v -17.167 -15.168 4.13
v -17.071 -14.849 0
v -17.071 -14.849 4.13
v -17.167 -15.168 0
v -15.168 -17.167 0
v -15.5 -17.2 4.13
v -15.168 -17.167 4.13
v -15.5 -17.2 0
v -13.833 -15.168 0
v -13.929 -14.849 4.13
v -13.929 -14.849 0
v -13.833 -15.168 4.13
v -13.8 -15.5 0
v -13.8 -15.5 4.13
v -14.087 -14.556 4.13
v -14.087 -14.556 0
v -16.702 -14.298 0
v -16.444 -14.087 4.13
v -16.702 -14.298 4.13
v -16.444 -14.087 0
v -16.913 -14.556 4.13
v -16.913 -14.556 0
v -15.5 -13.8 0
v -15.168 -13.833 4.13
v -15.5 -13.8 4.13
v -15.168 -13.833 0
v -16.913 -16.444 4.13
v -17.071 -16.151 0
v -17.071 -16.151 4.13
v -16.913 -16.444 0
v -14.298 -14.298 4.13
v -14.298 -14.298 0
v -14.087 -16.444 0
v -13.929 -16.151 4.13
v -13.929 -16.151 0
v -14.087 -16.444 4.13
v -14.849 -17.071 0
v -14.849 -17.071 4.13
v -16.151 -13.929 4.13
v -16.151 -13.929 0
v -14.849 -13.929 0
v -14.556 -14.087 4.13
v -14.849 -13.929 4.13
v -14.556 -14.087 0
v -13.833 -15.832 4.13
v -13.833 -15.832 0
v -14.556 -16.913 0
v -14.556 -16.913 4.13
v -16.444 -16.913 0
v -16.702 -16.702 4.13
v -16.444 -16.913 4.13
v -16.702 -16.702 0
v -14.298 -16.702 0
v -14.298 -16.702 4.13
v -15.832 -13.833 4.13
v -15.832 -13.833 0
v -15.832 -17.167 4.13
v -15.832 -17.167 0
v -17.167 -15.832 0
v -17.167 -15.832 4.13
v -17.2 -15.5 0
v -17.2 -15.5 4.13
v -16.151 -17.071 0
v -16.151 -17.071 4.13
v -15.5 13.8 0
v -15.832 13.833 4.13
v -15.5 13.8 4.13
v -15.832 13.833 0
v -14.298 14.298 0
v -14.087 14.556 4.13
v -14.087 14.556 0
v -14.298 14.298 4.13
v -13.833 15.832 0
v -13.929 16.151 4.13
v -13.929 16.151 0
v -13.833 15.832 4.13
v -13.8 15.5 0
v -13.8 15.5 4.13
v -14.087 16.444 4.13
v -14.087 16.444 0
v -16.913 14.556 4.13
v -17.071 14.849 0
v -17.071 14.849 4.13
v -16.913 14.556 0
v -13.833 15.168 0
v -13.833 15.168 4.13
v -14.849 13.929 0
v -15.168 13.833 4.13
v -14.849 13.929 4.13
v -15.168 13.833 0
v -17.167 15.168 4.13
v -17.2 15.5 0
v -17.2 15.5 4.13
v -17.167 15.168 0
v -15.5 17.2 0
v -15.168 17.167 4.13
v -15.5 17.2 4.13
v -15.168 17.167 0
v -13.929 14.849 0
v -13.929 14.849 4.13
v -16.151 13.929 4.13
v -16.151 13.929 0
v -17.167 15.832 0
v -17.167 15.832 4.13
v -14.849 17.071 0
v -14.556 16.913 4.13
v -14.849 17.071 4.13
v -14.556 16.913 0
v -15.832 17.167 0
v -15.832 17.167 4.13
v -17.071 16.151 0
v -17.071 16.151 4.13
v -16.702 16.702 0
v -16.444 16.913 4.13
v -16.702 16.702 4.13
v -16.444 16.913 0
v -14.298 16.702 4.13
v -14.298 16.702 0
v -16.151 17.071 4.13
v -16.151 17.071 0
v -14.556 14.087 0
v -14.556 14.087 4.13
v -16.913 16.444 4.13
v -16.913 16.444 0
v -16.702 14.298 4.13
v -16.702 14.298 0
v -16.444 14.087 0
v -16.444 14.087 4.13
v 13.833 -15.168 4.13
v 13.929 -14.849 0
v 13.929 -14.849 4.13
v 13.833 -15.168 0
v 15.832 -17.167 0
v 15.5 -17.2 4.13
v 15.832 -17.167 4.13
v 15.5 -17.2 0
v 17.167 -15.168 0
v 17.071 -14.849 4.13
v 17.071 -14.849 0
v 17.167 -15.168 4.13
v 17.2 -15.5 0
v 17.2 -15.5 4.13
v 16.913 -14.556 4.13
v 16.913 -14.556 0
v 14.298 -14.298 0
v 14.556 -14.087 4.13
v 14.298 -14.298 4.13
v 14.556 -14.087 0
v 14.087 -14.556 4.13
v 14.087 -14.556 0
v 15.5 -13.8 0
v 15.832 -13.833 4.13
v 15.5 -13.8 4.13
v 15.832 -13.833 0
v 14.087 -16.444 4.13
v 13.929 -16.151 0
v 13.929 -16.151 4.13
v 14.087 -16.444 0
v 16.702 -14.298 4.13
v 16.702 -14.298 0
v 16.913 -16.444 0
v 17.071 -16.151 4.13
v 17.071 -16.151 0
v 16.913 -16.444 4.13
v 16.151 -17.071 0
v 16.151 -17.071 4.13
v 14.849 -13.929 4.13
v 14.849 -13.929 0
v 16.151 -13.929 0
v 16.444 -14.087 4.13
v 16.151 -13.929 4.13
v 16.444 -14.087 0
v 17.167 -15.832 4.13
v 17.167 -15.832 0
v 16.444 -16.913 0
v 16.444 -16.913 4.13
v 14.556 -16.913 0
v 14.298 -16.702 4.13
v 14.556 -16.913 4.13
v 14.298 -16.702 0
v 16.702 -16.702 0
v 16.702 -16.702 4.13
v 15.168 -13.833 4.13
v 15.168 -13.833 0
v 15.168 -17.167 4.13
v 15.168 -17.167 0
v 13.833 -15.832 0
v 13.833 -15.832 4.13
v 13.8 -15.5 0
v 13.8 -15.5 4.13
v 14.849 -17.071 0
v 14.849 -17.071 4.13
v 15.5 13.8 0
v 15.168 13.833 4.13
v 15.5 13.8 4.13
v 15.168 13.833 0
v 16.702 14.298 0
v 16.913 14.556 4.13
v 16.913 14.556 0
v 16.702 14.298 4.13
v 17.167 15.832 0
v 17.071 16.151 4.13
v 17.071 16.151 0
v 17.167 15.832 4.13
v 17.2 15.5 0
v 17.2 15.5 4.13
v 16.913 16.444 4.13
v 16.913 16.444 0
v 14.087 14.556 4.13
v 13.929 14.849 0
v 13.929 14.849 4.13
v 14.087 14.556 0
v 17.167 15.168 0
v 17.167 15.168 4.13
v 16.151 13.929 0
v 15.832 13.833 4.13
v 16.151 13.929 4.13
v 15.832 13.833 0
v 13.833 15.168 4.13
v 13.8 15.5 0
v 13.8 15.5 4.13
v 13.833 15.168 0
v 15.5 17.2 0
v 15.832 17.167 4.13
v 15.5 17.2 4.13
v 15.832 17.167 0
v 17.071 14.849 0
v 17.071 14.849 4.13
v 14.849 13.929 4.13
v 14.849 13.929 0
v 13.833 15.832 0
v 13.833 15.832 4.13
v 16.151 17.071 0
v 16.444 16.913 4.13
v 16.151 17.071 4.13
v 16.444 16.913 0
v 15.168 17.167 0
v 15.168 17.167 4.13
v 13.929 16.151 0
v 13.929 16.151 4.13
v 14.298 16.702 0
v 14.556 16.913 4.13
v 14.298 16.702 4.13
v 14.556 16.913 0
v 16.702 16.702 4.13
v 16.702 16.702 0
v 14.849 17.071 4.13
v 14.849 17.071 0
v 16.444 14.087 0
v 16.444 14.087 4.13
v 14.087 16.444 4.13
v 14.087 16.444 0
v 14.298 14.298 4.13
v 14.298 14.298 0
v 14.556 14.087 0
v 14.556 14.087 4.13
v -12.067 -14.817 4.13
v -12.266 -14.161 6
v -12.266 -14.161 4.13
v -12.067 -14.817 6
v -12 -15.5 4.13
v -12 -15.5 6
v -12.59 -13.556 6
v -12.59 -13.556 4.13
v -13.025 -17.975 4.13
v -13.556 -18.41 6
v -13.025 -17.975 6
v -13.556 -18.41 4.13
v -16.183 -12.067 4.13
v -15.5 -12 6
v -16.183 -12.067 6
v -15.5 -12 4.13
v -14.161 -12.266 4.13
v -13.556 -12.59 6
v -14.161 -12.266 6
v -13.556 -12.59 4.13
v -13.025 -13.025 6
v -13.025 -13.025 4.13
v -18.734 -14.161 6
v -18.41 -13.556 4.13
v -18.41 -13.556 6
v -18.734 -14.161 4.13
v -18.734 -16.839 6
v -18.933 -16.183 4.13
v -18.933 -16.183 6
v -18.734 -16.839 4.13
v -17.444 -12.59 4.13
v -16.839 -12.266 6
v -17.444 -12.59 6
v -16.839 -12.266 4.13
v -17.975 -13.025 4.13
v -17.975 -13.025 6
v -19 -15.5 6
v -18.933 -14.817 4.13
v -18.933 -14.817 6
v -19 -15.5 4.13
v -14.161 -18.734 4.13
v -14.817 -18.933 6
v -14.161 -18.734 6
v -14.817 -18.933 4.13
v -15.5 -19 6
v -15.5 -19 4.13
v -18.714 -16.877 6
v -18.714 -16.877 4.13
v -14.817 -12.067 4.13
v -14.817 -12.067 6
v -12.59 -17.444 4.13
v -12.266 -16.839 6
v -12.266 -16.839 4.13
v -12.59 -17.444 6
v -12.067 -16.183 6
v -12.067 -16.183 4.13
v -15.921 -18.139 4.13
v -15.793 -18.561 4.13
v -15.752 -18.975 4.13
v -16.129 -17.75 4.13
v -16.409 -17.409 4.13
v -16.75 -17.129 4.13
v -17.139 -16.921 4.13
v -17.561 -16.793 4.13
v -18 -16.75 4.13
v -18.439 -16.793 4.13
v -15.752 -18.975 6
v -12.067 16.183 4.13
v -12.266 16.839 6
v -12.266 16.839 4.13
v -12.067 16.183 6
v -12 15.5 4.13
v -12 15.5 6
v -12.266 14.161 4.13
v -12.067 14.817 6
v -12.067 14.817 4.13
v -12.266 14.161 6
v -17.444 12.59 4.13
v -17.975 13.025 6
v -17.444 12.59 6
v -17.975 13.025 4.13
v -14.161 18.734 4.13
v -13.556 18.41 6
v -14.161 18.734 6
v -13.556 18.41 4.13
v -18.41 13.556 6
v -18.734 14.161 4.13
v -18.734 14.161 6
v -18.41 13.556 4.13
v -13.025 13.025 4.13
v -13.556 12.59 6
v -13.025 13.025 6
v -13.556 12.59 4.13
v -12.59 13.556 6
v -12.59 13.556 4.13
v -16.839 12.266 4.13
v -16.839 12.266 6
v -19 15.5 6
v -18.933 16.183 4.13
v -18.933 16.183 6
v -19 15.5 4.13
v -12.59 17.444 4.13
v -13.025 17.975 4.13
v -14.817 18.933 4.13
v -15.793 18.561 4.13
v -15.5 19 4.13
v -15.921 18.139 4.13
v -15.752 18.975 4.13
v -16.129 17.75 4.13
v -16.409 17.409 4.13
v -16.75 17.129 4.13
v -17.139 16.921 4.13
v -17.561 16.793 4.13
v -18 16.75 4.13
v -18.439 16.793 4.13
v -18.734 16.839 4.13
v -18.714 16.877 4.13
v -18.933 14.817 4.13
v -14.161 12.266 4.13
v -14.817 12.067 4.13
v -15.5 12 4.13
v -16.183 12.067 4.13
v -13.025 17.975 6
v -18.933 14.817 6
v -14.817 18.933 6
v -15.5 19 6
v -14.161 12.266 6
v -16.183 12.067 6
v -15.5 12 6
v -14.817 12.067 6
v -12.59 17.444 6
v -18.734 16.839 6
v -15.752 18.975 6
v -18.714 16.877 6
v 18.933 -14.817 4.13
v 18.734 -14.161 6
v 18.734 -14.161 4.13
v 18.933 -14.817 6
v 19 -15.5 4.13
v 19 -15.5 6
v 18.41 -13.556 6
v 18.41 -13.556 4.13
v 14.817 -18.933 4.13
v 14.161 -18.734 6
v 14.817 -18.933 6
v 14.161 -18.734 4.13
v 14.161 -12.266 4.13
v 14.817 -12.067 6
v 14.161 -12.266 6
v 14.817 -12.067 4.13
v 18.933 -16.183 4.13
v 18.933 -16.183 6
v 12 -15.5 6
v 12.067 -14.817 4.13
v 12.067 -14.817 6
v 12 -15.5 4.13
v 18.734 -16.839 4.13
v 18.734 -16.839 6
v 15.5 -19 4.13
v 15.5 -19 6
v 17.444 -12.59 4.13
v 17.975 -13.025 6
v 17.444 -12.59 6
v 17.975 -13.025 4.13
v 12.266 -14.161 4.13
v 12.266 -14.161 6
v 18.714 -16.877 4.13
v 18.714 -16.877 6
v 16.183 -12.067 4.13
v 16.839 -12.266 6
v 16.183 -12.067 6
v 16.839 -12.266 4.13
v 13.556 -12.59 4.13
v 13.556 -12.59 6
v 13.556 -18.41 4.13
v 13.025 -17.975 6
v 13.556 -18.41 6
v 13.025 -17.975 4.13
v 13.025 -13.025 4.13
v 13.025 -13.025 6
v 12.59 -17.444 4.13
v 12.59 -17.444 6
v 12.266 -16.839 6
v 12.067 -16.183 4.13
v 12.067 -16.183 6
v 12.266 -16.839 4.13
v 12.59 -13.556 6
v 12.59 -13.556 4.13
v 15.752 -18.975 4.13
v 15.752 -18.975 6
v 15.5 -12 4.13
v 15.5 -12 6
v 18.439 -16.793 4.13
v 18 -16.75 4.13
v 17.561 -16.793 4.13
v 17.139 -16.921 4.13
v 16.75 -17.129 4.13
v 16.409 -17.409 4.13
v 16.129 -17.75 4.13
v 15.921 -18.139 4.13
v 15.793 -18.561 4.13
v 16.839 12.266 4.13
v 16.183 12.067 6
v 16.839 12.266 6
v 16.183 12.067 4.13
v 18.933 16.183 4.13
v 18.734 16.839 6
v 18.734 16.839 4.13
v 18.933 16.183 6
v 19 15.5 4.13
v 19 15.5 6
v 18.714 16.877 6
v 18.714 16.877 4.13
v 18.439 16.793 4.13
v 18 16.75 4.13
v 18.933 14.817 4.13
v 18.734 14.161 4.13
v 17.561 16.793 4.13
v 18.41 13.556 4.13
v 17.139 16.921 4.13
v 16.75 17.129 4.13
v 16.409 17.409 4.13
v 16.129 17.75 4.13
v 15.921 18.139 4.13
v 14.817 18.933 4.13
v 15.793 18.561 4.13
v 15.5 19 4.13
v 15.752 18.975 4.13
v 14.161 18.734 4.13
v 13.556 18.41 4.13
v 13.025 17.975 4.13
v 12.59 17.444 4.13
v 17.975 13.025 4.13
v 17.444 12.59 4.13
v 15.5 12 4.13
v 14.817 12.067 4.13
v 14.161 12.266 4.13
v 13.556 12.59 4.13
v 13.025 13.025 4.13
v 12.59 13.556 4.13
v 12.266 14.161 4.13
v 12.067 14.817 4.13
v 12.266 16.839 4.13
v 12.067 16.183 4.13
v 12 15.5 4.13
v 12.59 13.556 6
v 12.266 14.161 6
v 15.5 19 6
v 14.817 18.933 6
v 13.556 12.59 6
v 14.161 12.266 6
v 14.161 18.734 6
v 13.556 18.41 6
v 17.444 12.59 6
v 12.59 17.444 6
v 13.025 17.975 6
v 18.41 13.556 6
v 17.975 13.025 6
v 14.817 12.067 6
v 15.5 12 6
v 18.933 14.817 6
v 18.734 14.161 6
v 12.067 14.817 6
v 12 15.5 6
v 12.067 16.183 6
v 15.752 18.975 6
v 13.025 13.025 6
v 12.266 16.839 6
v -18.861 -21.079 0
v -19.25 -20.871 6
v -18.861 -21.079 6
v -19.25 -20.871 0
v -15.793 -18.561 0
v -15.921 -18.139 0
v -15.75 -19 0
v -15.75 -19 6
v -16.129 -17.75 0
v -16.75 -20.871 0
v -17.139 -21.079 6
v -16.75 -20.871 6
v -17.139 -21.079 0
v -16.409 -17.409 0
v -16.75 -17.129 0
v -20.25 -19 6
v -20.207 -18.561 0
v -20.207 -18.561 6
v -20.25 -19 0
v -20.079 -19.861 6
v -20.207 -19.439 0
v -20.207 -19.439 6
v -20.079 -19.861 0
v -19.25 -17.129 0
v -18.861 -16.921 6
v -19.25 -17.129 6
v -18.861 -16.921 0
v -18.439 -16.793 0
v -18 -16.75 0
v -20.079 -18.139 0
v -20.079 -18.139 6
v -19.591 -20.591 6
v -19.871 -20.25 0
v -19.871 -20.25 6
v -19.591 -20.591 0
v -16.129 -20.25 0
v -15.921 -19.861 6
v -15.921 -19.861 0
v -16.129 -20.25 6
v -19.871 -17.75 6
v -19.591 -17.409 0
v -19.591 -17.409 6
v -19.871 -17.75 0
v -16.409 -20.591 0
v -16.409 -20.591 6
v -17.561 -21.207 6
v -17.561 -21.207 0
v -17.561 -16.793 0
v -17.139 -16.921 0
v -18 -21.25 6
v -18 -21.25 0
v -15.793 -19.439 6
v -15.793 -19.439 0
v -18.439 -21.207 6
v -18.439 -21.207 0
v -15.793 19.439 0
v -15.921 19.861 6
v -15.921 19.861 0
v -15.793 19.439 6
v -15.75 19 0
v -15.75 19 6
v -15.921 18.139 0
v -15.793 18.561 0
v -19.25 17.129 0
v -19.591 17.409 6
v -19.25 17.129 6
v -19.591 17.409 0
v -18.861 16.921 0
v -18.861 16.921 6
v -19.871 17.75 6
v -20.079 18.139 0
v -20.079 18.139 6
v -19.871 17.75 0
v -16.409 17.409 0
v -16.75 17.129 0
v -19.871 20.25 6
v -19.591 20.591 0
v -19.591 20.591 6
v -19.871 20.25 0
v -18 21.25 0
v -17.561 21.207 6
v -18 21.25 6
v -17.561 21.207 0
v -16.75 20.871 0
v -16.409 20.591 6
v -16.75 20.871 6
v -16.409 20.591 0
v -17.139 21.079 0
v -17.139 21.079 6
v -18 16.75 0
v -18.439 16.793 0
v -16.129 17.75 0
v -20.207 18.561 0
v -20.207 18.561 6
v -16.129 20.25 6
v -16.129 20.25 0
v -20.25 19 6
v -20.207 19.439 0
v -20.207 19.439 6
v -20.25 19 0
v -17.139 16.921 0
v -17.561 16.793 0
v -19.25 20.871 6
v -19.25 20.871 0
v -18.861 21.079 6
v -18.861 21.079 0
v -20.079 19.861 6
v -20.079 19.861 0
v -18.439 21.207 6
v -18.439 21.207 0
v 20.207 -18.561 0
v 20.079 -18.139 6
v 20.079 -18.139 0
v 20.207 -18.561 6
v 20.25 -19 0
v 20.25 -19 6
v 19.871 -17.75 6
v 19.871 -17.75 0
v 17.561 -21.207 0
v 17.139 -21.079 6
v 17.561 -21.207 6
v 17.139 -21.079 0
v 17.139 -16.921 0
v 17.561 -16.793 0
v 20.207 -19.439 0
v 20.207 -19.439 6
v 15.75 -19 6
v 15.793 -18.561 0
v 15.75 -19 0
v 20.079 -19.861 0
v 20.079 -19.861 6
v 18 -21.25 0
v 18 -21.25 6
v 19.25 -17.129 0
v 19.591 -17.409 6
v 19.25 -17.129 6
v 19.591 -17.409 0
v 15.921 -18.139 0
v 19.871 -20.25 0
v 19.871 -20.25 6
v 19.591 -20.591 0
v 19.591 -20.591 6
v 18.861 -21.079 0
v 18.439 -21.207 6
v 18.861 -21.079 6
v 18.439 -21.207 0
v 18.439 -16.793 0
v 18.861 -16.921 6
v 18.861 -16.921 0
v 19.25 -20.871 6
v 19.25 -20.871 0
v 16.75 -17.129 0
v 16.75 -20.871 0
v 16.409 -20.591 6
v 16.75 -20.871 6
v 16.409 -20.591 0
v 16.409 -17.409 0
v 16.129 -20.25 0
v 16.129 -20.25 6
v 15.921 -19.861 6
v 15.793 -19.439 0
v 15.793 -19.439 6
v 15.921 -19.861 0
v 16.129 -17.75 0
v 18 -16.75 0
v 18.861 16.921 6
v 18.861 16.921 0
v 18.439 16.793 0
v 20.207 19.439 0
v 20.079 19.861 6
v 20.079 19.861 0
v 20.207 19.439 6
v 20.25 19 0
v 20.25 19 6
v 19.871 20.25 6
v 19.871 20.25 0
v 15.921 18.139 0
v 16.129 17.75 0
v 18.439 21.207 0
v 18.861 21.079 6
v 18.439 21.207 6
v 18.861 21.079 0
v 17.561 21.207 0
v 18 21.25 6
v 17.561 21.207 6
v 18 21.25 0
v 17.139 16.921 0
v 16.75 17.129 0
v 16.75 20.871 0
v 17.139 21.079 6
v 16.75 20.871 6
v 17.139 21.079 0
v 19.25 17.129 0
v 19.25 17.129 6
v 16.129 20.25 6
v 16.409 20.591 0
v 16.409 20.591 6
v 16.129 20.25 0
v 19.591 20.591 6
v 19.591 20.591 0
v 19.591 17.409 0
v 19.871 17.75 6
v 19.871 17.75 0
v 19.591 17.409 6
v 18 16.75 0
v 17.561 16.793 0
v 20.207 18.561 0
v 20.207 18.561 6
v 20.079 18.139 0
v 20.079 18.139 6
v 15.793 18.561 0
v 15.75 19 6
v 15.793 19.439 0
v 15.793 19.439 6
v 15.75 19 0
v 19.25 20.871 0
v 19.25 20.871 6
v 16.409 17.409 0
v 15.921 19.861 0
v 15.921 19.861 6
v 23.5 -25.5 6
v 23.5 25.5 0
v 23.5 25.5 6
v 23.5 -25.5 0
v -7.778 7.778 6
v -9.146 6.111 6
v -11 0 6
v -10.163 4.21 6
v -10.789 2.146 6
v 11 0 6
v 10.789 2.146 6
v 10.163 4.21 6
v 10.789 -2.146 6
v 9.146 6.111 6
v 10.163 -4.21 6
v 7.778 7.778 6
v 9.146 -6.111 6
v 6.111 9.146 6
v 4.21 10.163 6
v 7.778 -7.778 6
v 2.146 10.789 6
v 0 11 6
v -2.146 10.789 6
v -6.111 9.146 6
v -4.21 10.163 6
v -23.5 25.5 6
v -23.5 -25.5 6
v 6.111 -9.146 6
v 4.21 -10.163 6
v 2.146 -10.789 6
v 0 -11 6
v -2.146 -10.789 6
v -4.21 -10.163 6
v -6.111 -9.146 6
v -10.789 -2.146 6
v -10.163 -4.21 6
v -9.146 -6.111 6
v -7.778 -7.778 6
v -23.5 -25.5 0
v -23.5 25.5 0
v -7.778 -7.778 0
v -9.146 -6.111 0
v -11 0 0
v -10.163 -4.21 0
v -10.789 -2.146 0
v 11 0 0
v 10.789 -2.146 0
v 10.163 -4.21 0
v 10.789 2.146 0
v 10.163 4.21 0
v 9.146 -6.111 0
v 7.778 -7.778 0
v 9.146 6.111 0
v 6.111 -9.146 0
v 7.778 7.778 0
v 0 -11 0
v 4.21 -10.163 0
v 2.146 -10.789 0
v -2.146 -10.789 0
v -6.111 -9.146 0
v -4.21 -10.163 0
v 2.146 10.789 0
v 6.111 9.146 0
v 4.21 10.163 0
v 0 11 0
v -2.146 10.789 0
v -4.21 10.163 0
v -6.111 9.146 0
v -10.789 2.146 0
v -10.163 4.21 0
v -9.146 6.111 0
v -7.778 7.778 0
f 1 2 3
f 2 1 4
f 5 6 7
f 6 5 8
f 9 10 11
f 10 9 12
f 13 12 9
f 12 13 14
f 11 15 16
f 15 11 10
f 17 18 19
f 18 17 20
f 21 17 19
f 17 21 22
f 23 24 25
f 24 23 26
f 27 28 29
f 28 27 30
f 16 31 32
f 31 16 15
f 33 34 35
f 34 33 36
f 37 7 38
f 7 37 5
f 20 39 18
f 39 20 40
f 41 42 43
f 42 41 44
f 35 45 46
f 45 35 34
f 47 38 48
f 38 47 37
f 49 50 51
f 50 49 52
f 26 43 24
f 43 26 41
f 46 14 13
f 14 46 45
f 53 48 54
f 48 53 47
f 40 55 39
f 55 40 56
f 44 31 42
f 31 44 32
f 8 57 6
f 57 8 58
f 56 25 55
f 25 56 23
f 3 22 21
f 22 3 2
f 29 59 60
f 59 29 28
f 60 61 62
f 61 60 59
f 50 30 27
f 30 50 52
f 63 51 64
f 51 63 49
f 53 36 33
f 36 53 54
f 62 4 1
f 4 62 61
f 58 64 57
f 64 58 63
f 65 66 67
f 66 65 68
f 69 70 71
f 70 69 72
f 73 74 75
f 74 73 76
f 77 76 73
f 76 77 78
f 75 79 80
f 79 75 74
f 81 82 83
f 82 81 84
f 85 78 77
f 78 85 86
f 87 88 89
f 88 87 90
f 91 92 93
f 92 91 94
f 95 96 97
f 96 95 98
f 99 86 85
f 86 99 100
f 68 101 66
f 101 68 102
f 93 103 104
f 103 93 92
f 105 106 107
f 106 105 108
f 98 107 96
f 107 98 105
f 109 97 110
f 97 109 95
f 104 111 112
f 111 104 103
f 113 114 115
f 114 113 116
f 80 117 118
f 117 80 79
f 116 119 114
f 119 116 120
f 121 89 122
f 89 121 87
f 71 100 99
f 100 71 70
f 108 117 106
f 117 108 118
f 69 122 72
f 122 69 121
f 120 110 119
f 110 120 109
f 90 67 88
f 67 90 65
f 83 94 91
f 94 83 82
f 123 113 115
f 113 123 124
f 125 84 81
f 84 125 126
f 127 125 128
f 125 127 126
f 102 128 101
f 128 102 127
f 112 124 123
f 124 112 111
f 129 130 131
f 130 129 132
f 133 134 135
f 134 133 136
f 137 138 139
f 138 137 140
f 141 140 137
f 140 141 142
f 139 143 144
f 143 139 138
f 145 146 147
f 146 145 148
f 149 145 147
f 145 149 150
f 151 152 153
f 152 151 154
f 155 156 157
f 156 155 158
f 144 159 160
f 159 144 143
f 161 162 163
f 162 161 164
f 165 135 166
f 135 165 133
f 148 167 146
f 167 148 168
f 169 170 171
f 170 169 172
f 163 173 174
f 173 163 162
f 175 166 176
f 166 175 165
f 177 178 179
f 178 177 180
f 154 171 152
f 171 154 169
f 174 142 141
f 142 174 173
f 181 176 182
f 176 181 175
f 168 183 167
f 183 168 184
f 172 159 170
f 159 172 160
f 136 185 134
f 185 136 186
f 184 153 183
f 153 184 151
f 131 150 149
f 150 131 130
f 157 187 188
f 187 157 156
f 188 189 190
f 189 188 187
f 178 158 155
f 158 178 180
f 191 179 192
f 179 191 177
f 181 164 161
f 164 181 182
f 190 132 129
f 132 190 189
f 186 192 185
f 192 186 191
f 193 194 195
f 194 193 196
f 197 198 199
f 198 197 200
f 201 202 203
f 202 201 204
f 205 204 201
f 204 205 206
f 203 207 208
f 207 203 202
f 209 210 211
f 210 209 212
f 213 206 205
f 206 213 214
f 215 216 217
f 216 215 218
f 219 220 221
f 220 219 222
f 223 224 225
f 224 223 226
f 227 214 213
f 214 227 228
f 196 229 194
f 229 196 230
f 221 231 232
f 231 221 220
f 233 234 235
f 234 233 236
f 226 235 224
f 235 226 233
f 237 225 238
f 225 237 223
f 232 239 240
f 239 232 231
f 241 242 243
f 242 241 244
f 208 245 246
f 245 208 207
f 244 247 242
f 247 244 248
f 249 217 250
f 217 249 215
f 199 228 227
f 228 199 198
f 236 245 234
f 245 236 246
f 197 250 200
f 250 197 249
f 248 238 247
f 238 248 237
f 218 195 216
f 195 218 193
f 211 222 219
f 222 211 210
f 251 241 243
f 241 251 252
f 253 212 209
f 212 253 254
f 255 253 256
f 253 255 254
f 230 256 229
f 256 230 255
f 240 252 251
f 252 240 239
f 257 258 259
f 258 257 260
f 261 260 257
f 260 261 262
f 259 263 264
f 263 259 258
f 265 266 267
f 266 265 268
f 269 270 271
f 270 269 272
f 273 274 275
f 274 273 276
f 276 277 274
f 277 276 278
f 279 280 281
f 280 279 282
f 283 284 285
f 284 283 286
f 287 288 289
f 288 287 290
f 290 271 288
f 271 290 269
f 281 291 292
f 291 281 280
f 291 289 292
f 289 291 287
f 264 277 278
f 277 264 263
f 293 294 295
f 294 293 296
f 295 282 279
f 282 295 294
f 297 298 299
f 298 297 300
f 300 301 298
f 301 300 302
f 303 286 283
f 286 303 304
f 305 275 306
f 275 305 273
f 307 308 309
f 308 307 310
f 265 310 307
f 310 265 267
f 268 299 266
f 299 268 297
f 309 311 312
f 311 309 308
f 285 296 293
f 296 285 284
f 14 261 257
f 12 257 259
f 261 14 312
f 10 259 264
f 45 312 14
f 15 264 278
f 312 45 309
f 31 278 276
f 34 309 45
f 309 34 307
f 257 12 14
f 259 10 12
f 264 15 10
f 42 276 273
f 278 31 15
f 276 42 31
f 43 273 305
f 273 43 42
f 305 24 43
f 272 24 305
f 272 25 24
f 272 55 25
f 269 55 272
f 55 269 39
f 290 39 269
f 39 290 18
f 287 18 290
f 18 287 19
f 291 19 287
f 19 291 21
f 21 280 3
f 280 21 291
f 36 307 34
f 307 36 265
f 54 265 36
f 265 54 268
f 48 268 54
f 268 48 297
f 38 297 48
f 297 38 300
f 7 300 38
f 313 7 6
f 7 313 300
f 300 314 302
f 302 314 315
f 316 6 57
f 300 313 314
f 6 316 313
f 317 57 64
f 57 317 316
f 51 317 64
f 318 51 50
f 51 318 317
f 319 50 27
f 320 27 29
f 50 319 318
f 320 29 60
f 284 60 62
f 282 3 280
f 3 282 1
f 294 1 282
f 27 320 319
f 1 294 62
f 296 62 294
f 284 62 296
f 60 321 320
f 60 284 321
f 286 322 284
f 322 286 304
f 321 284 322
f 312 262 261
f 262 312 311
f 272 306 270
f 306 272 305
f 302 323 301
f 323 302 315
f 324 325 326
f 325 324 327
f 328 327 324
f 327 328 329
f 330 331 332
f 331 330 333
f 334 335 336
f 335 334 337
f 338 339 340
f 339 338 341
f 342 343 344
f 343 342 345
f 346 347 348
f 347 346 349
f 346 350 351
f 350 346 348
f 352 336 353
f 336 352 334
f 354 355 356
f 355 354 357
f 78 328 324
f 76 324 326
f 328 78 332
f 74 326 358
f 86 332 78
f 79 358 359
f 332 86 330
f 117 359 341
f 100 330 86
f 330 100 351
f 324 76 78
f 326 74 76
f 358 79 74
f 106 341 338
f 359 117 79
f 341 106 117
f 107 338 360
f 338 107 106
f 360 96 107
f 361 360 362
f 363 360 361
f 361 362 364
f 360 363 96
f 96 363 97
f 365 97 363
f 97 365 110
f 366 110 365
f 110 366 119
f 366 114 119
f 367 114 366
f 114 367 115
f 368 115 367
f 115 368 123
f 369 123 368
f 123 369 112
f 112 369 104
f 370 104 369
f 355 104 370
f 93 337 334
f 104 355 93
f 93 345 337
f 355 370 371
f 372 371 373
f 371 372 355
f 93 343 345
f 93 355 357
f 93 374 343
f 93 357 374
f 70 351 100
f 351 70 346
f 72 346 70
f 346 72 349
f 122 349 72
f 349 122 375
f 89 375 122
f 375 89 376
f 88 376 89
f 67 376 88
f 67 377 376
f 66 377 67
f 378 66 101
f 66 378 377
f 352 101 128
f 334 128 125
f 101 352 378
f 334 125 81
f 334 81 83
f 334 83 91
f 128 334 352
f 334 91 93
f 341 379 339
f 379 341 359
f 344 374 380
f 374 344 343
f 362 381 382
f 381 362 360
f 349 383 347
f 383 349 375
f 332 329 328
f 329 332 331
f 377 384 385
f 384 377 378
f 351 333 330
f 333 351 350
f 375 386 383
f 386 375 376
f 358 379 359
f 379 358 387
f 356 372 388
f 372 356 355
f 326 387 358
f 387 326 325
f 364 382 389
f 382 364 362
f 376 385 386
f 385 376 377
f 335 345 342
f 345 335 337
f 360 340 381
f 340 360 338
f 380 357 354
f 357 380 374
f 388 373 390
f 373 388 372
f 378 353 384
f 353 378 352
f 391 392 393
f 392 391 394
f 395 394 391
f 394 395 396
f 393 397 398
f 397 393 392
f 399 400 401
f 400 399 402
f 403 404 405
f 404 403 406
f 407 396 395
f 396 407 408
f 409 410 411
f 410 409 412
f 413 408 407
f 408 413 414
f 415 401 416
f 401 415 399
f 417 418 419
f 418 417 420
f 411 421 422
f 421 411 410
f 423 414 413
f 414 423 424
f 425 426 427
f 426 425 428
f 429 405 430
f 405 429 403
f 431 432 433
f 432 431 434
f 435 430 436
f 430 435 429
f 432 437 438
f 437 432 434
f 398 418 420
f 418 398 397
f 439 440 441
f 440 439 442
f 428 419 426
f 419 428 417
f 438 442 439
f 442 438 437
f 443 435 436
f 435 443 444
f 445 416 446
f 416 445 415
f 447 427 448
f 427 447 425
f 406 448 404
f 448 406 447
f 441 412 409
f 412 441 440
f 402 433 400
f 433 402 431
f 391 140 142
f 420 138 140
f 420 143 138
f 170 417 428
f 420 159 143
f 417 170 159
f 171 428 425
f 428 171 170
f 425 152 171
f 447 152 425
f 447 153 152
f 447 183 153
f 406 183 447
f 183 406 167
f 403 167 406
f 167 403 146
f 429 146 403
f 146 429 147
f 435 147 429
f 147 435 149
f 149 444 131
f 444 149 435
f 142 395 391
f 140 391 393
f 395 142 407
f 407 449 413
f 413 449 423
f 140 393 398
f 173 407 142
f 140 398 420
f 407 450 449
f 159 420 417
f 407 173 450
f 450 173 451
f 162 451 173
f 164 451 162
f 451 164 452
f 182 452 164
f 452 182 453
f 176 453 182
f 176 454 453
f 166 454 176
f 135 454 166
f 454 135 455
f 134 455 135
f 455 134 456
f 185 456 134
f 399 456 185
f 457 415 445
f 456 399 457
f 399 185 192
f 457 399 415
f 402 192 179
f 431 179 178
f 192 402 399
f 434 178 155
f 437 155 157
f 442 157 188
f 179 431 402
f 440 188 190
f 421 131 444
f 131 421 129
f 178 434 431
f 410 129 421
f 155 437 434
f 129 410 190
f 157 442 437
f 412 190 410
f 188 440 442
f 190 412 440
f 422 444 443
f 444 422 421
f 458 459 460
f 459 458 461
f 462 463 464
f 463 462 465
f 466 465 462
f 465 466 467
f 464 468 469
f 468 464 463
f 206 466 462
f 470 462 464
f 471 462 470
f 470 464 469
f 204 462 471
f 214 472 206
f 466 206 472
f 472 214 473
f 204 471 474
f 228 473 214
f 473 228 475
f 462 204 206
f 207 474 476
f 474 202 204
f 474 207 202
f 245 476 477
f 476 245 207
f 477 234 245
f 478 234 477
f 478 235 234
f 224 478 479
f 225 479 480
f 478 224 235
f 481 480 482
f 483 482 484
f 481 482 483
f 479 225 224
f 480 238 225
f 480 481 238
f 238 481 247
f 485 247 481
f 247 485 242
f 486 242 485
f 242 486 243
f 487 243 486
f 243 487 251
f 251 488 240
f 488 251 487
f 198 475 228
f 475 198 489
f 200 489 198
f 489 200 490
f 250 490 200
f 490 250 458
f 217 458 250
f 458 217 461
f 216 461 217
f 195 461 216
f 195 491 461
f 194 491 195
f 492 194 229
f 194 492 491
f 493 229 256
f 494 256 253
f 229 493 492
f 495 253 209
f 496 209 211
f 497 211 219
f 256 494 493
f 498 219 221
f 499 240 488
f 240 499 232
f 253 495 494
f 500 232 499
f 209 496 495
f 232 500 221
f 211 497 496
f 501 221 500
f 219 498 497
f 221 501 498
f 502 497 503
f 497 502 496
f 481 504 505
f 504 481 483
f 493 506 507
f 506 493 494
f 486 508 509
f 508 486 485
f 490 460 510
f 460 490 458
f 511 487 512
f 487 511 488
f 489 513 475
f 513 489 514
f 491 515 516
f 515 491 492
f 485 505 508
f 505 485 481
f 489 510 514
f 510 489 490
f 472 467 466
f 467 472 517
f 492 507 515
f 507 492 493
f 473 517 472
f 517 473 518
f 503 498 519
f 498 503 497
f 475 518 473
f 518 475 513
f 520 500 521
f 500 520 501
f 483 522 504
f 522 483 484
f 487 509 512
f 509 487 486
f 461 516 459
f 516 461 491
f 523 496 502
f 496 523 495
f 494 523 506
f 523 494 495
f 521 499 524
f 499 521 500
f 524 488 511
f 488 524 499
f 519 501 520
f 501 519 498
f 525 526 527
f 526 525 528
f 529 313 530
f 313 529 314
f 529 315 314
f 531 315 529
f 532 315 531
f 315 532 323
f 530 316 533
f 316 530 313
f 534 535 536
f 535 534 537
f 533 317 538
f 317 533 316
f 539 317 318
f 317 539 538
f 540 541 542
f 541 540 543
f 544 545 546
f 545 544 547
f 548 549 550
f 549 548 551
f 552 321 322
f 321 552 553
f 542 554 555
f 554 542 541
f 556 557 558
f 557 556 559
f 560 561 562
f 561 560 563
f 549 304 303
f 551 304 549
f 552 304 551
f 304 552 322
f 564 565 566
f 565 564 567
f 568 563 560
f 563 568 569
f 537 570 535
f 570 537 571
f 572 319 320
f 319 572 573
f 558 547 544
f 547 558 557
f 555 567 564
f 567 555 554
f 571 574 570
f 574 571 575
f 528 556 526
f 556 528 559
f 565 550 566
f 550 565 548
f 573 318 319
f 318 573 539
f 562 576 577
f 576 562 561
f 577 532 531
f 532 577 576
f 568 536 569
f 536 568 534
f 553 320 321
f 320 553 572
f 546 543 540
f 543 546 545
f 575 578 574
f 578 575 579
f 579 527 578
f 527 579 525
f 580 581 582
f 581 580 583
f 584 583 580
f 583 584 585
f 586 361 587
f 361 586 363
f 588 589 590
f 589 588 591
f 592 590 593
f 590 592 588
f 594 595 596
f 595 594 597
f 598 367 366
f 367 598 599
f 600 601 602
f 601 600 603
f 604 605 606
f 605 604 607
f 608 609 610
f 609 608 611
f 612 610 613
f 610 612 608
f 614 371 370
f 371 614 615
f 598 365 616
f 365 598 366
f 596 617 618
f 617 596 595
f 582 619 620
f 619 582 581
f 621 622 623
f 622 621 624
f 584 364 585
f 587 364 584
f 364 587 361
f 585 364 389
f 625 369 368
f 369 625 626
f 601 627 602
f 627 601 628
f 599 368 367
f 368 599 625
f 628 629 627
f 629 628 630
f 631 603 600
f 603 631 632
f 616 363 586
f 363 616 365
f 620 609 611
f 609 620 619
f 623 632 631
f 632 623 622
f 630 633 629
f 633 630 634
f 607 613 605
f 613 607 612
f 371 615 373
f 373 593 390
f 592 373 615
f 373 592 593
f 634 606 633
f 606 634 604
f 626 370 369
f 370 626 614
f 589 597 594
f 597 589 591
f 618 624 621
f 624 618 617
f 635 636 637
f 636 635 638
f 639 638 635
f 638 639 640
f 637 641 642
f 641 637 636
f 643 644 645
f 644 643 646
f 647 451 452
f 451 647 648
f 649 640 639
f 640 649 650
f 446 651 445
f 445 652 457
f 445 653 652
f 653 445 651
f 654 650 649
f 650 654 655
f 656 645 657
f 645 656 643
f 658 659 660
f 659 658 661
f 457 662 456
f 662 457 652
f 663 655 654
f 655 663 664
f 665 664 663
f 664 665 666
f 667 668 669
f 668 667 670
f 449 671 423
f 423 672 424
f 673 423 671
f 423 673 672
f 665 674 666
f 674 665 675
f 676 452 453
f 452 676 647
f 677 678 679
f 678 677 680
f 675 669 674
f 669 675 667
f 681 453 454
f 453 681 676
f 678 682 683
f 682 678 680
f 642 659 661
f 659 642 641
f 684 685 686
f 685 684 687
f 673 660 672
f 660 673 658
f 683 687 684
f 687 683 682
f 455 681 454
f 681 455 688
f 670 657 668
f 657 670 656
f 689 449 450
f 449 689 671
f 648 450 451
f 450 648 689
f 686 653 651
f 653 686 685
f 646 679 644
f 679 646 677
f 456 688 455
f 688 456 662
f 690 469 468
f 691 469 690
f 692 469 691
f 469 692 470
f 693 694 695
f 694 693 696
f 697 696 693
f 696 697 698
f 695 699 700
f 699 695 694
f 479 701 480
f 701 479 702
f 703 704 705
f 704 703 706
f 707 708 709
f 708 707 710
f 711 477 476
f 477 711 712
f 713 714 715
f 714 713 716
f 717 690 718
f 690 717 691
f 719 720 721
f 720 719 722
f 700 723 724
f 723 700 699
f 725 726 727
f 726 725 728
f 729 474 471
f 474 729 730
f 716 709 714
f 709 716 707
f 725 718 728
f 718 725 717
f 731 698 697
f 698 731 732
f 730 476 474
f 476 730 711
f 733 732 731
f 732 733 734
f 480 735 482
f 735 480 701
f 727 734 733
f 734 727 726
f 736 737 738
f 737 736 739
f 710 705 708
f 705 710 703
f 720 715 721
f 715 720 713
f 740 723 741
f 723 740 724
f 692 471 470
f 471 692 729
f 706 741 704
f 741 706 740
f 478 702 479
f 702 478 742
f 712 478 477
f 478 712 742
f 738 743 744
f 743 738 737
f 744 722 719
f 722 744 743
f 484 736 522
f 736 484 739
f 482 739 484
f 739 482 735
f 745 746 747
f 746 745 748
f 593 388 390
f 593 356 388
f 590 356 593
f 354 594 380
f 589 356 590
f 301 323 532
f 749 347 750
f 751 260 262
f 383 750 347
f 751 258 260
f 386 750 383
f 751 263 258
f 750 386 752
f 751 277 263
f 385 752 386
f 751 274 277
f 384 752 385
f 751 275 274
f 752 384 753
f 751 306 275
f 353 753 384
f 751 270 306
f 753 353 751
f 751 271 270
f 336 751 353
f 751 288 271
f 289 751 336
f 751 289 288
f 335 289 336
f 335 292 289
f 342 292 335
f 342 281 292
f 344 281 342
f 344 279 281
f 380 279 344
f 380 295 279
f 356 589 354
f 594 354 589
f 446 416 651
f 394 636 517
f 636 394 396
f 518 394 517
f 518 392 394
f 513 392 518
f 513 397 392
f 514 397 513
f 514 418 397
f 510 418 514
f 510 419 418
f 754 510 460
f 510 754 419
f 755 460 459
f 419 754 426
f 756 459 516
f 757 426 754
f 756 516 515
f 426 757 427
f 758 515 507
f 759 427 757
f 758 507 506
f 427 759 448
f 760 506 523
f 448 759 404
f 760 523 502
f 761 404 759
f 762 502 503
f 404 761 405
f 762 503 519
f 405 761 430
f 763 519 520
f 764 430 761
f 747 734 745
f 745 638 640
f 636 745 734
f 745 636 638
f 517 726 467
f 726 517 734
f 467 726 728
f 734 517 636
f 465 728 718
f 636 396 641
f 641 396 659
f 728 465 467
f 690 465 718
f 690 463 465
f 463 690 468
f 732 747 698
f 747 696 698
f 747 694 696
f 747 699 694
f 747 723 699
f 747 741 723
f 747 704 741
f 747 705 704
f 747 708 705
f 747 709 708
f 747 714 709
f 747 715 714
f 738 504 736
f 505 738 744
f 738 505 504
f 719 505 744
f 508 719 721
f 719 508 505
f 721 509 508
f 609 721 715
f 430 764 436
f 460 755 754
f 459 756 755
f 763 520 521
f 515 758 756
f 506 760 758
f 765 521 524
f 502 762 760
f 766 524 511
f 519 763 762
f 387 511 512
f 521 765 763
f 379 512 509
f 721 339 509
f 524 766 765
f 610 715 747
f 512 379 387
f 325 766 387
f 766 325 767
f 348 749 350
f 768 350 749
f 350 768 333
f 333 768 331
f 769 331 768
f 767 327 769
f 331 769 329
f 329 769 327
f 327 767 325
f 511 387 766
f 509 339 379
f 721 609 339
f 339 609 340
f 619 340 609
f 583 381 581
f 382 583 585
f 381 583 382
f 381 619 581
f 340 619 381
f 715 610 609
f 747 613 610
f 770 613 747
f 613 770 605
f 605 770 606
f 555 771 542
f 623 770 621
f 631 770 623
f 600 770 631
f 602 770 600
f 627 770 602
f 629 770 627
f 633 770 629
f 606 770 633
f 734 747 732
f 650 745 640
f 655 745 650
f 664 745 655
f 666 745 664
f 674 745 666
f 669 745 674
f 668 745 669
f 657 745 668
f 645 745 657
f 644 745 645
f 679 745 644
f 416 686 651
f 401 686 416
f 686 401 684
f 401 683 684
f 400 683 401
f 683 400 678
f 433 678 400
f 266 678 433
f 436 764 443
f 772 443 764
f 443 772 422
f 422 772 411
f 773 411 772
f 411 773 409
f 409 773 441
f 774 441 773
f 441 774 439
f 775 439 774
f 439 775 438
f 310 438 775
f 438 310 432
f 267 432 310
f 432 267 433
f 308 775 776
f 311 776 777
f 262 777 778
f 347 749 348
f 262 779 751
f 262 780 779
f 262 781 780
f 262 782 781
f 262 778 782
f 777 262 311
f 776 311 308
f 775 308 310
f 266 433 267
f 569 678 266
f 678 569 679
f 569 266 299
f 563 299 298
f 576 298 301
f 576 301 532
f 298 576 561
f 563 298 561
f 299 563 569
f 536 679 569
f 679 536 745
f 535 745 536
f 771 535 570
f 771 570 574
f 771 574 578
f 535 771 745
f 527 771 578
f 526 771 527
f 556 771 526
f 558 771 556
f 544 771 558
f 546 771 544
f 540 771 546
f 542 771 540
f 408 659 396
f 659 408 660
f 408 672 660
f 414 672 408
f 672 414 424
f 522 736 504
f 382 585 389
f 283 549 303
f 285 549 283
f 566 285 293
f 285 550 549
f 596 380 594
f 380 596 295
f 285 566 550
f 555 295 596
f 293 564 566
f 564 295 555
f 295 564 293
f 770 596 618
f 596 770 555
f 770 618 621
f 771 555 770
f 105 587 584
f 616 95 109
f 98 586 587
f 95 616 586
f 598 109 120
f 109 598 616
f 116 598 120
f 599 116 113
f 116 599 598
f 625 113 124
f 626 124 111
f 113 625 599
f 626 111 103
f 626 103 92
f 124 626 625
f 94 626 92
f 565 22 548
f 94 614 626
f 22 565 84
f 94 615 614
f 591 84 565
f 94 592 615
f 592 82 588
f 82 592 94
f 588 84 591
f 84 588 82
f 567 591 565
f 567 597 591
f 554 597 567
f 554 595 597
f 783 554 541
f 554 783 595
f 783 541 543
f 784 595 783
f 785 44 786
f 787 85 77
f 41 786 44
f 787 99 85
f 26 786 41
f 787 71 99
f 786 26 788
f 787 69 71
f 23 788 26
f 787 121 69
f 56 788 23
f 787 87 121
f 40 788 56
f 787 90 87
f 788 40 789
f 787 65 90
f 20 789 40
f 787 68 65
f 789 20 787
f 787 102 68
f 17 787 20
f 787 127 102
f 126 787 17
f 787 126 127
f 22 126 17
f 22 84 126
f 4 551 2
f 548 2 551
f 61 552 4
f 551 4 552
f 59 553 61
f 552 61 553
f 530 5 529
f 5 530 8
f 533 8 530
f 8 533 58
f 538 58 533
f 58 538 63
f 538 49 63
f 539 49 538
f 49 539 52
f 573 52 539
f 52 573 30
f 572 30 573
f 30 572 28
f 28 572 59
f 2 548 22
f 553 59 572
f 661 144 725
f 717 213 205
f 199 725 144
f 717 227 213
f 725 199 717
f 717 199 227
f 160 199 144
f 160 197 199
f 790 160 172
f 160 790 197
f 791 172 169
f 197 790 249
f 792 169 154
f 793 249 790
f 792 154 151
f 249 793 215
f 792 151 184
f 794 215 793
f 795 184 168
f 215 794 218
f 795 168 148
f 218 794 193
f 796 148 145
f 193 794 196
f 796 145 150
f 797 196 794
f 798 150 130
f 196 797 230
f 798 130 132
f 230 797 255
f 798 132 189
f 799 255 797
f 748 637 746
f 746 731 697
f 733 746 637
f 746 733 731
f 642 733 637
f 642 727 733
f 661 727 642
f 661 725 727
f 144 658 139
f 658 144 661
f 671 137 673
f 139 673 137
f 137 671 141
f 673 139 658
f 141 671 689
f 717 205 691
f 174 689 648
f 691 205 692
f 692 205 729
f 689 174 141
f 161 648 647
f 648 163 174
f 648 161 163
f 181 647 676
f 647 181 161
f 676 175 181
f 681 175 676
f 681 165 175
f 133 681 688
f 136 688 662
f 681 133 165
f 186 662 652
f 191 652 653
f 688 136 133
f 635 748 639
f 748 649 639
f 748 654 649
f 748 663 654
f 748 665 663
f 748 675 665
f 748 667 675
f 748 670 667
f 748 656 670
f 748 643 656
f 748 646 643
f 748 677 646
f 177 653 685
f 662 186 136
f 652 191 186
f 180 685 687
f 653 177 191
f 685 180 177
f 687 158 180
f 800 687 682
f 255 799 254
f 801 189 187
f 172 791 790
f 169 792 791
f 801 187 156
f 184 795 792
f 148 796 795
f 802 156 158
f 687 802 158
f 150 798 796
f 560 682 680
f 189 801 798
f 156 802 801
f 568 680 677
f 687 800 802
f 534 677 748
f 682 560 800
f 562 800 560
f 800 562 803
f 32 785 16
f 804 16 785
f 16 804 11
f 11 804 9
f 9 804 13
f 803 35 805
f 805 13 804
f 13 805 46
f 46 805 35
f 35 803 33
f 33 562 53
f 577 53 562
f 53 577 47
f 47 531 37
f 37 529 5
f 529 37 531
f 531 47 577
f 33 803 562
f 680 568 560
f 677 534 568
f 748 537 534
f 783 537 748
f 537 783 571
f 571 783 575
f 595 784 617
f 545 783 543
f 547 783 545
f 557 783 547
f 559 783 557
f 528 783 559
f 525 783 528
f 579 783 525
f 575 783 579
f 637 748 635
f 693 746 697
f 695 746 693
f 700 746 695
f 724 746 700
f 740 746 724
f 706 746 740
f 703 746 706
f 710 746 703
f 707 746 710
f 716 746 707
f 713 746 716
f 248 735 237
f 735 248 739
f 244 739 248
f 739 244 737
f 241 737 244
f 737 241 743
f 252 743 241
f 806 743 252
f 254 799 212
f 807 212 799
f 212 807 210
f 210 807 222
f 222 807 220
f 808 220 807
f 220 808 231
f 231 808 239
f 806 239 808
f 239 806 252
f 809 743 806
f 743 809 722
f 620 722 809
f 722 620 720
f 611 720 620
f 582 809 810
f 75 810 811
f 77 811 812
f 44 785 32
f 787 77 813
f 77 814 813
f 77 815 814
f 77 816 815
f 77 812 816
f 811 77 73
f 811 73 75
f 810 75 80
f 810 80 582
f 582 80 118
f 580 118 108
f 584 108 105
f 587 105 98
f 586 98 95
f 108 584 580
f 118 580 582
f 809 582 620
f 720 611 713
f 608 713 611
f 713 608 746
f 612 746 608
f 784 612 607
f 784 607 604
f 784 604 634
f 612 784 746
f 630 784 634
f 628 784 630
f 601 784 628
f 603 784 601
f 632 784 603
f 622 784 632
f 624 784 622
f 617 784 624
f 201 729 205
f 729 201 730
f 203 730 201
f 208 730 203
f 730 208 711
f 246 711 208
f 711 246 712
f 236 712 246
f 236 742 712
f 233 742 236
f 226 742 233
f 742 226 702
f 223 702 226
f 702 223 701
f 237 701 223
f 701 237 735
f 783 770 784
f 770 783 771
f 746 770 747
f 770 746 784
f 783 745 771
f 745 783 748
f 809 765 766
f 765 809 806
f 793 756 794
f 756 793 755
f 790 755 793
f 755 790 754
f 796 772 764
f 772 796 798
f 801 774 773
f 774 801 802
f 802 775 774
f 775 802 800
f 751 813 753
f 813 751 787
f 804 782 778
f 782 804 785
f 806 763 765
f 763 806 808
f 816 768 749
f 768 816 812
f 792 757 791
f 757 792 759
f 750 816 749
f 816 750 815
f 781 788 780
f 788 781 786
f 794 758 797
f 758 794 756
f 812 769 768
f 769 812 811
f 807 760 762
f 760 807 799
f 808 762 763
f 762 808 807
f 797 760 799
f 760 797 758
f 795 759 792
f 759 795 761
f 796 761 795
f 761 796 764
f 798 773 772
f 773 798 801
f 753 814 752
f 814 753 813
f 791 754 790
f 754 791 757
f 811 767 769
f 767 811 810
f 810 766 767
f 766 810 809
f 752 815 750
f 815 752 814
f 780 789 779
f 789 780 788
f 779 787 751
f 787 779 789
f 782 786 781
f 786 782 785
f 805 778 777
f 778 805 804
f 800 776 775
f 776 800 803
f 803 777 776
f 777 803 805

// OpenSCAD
$fn = 32;

// ----------------------------------------------------------------------
// Motor mount plate: NEMA17, 47 x 51 x 6 mm
// ----------------------------------------------------------------------

// --- parameters (mm) ---
plate_w = 47;             // plate length, X
plate_d = 51;             // plate width, Y
plate_t = 6;              // plate thickness
pattern = 31;             // NEMA17 bolt spacing
motor_d = 3.4;            // NEMA17 screw clearance
pilot_d = 22;             // pilot boss bore
cb_d = 7;                 // counterbore seat
cb_h = 1.87;              // counterbore depth
second_d = 4.5;           // second fastener hole

module plate() {
  translate([-plate_w / 2, -plate_d / 2, 0]) cube([plate_w, plate_d, plate_t]);
}

module motor_holes() {
  for (sx = [-1, 1]) for (sy = [-1, 1])
    translate([sx * pattern / 2, sy * pattern / 2, -1])
      cylinder(h = plate_t + 2, d = motor_d);
}
module motor_counterbores() {
  for (sx = [-1, 1]) for (sy = [-1, 1])
    translate([sx * pattern / 2, sy * pattern / 2, plate_t - cb_h])
      cylinder(h = cb_h + 0.6, d = cb_d);
}

difference() {
  union() {
    plate();
  }
  motor_holes();
  translate([0, 0, -1]) cylinder(h = plate_t + 2, d = pilot_d);
  motor_counterbores();
  for (sx = [-1, 1]) for (sy = [-1, 1])
    translate([sx * 18, sy * 19, -1]) cylinder(h = plate_t + 2, d = second_d);
}
